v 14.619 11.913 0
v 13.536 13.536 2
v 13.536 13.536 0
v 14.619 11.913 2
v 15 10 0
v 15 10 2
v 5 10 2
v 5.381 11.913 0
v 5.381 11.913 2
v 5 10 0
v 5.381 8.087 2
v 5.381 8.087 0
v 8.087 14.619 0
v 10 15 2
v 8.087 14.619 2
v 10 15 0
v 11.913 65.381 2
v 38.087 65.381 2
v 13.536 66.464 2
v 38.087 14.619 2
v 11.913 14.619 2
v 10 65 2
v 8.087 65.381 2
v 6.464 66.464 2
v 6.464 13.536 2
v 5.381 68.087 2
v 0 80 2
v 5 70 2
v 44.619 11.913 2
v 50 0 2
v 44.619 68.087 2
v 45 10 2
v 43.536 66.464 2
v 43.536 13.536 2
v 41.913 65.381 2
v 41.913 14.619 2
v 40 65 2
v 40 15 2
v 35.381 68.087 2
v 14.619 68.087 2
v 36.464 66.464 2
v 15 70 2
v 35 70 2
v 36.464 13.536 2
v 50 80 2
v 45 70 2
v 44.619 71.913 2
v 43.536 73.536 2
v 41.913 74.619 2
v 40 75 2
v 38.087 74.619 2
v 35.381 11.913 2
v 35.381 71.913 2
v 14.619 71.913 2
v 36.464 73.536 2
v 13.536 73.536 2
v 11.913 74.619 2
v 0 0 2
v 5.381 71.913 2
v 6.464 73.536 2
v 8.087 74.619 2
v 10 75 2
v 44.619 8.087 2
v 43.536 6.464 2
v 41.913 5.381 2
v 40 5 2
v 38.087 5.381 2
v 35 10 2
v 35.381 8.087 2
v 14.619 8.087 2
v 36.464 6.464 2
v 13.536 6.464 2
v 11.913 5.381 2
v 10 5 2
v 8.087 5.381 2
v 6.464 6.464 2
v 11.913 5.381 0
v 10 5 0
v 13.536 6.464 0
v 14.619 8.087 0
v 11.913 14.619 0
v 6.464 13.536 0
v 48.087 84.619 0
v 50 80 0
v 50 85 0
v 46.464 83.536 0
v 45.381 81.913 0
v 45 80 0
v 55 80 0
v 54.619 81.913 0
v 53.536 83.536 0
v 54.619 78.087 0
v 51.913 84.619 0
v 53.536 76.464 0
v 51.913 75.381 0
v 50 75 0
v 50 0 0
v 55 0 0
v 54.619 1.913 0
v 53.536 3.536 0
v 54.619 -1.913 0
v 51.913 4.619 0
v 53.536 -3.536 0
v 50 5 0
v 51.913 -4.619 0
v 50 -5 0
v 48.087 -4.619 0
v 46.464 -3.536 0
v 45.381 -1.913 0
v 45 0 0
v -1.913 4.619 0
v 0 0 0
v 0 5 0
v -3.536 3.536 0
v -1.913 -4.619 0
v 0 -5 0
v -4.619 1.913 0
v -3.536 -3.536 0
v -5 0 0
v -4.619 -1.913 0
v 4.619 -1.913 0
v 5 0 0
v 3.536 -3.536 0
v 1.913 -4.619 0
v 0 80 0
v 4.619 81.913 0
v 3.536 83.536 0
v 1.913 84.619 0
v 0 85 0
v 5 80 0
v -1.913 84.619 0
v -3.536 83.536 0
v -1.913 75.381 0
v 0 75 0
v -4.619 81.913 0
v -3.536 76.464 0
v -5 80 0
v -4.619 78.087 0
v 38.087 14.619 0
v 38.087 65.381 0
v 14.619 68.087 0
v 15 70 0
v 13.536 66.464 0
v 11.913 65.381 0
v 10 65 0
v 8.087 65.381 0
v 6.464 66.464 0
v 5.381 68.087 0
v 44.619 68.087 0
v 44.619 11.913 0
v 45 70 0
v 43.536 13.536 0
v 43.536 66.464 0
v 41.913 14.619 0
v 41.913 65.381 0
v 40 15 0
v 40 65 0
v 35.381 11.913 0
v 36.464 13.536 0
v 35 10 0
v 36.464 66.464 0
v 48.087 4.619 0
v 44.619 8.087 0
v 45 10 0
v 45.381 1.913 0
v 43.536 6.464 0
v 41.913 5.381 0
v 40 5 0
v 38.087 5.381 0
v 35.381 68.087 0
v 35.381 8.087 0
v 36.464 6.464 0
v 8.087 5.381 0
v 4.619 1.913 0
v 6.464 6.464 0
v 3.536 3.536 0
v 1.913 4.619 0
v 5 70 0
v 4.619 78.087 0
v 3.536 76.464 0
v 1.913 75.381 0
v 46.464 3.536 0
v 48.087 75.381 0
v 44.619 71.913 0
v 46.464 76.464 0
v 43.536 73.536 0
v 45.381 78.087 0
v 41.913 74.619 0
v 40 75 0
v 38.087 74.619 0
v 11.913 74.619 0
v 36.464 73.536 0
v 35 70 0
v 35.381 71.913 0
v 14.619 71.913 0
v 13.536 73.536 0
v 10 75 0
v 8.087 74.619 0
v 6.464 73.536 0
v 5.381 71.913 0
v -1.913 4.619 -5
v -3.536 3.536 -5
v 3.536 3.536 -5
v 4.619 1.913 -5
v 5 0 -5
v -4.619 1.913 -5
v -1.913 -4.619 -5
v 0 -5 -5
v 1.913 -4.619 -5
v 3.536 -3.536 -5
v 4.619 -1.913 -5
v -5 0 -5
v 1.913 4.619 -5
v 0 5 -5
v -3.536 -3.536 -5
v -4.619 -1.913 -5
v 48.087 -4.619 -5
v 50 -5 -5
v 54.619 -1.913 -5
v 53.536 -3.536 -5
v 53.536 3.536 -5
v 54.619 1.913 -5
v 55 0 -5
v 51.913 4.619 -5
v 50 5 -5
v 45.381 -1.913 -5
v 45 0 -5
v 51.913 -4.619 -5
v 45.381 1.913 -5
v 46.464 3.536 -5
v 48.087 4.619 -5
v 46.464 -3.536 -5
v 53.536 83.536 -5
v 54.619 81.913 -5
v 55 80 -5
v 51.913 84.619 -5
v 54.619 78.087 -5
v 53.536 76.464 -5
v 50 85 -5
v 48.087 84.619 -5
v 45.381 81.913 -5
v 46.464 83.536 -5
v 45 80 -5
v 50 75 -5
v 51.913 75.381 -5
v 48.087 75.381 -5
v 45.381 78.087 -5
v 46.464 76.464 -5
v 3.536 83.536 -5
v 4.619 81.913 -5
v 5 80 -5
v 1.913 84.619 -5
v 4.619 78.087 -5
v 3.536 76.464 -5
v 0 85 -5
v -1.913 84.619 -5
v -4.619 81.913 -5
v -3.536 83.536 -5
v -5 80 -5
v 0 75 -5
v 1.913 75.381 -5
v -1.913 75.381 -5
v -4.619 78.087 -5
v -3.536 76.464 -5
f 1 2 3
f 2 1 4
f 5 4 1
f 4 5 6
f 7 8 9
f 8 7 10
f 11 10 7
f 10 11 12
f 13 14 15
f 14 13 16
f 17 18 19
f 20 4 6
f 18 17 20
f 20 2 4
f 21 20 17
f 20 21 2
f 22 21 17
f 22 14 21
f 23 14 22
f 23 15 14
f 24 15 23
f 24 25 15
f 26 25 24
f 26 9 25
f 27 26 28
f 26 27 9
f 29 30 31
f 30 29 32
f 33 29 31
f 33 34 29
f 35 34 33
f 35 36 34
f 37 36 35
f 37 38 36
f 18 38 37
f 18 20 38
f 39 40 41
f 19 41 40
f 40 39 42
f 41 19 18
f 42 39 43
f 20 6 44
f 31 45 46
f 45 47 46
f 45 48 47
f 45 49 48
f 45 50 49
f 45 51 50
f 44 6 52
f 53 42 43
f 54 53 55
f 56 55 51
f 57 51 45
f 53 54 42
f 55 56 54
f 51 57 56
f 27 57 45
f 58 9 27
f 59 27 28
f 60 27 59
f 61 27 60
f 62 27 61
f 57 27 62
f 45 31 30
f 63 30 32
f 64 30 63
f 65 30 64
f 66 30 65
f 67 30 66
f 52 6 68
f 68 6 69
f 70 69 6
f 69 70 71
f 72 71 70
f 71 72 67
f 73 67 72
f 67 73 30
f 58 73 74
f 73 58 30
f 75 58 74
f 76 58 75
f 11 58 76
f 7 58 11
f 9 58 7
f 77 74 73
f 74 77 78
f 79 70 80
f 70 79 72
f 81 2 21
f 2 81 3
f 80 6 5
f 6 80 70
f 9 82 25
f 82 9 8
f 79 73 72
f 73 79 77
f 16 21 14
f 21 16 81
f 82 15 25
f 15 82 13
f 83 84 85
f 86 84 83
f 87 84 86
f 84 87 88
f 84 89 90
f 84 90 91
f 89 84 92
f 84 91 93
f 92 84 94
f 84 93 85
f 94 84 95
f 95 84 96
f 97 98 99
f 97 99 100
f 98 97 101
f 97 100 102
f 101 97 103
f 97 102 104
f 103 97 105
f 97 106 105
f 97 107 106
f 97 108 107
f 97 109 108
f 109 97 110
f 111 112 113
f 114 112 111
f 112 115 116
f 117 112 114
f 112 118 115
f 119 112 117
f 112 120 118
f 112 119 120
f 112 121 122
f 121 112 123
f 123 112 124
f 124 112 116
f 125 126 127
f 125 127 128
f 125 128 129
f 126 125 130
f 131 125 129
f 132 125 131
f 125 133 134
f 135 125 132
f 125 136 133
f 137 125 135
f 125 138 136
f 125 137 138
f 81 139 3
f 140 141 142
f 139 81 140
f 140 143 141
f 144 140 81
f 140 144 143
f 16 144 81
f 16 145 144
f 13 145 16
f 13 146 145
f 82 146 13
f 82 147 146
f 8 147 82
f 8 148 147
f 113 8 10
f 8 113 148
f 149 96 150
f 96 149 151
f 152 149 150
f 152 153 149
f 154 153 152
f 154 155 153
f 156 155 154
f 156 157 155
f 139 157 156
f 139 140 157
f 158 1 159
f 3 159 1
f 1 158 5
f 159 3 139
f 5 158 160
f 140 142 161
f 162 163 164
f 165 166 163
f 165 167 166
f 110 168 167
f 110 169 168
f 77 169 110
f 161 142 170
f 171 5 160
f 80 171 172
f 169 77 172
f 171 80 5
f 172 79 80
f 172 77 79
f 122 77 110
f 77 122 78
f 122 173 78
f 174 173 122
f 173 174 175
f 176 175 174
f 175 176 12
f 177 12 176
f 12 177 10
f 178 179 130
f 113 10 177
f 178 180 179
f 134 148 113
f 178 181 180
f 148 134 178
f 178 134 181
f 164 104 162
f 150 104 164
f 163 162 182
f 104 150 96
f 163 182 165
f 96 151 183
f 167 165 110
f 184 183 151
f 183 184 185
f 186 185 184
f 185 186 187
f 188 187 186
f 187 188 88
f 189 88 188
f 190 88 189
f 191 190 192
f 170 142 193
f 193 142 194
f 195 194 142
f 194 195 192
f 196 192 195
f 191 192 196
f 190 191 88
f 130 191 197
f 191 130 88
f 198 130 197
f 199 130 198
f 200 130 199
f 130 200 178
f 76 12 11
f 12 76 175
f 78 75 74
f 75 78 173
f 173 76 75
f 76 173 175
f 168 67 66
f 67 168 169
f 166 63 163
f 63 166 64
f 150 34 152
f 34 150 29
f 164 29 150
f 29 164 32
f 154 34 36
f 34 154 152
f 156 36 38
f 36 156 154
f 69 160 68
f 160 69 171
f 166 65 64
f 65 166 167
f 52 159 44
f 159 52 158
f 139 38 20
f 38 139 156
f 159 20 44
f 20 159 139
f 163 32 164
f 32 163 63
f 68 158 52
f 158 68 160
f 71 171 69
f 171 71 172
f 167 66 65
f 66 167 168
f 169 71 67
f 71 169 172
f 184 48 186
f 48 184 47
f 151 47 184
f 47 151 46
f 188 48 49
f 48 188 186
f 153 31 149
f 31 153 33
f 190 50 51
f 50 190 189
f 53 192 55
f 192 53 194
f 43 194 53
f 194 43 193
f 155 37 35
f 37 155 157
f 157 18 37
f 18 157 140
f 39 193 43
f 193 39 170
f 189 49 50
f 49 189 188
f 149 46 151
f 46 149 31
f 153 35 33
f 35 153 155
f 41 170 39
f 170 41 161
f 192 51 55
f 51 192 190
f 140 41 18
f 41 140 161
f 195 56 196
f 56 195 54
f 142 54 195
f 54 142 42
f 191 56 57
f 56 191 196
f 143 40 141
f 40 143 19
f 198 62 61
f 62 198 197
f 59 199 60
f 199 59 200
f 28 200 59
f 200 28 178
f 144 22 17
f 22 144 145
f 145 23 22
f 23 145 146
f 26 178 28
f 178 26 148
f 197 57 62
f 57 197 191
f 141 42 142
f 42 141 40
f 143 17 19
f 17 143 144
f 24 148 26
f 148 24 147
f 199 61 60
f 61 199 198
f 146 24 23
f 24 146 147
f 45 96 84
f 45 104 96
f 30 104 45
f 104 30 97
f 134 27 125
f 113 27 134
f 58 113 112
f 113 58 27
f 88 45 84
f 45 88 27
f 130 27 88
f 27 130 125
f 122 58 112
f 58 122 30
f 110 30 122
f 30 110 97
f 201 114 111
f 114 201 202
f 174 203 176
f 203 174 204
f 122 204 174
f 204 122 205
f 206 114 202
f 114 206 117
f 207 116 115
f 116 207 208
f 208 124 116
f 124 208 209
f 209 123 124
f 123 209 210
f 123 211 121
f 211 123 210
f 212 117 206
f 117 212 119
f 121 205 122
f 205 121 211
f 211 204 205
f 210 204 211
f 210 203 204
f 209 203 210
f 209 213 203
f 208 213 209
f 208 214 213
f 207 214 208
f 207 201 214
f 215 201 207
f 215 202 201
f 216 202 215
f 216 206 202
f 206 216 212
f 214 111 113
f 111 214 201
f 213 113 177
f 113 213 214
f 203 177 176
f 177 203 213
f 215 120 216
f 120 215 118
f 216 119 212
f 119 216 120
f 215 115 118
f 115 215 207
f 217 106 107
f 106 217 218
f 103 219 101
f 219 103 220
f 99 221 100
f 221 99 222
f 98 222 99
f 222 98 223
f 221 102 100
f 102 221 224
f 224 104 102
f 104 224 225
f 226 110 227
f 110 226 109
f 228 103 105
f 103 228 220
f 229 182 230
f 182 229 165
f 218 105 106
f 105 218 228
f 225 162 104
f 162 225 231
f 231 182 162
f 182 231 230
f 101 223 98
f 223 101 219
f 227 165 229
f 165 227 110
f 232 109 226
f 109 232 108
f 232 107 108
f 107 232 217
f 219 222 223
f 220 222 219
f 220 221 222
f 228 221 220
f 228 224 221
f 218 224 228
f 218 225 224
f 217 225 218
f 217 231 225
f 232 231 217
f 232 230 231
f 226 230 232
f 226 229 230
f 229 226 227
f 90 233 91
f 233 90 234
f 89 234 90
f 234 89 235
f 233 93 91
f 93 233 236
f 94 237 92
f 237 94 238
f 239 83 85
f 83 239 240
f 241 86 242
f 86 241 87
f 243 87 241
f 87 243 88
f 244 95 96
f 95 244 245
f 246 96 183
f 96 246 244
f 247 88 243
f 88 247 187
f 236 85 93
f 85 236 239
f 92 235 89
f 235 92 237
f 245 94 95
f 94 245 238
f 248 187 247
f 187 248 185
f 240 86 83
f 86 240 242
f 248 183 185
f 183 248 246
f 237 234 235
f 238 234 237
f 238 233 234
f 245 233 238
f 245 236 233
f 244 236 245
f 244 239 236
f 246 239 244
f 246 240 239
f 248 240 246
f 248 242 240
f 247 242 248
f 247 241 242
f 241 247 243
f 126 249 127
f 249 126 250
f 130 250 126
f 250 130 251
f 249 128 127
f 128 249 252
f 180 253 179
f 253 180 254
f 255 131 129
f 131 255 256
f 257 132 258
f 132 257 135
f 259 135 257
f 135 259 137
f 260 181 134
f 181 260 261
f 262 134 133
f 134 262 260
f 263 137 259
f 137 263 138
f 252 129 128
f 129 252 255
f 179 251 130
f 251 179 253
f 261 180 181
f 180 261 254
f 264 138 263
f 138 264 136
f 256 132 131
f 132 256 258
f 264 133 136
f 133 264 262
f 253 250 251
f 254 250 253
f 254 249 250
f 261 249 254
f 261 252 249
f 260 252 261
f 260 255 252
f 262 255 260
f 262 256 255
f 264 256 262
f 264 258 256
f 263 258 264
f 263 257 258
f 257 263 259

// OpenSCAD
// file: ../../../assets/components/triangular_right_prism.scad
module triangular_right_prism(l, w, h){
    polyhedron(//pt 0        1        2        3        4        5
        points=[[0,0,0], [l,0,0], [l,w,0], [0,w,0], [0,0,h], [l,0,h]],
        faces=[[0,1,2,3],[5,4,3,2],[0,4,5,1],[0,3,4],[5,2,1]]
    );
}
// file: ../../../assets/components/vents.scad
/*
    Produces an alternating pattern that tries to fit in as many
    slots with the given radius in the given area. rows of slots
    alternate indentation

    parameters:
    -a  side a size
    -b  side b size
    -r  radius of the slot circles, their centers are one diameter appart
*/

module vent_pattern(a, b, r = 2,) {
    $fn=10;
    l = r * 2;
    col_size = l + (r * 3);
    row_size = (r * 3);
    rows = b / row_size;
    cols = a / col_size;
    translate([-(col_size * (cols-1) / 2), -(row_size * (rows-1) / 2), 0])
    for(row=[0:rows - 1]) {
        for(col=[0:cols - 1]){
            translate([col_size * col - (row % 2 * col_size / 2), row_size * row ,0])
            hull() {
                circle(r);
                translate([l,0,0])
                circle(r);
            }
        }
    }
}

// showcase
vent_pattern(a = 20, b = 10, r = 1);
// file: ../../../assets/assemblies/insert_mounts.scad
use <../components/triangular_right_prism.scad>

/*
    module insert_mount
    -
    This module is thought to be used for threaded insert mounts,
    if used only for fasteners consider the difference of diameter
    between the threads and the shaft.
    -
    parameters:
    -h                  total height of the mount
    -insert_r           radius of the screw or insert
    -thickness        thickness of the supports and walls around the insert
    -support_h          height of the support as percent of h
    -support_amount     number of supports
    -support_every_deg  degrees between supports
    -
    notice that ideally the support_amount x support_every_deg should
    not equal more than 360
*/

module insert_mount(
    h = 10,
    insert_r = 1.75,
    thickness = 2,
    support_h = 100,
    support_amount = 4,
    support_every_deg = 90
) {
    $fn=15; // set facette number
    support_h = h * support_h / 100;

    // The body of the mount
    difference() {
        cylinder(h = h, r = insert_r + thickness);
        cylinder(h = h, r = insert_r);
    }

    // Supports
    if (support_amount) {
        rotate(-90) // First support to point to the positive x side
        for(i=[0:support_amount - 1]) {
            rotate(i * support_every_deg) {
                translate([-thickness/2,0,0]){
                    translate([0 , insert_r, 0])
                    cube([thickness, thickness, support_h]);

                    translate([0, insert_r + thickness, 0])
                    triangular_right_prism(thickness, support_h, support_h);
                }
            }
        }
    }
}

/*
    block of four insert mounts

    params:
    -x              distance between corner screw-hole centers in the x axis
    -y              distance between corner screw-hole centers in the y axis
    -h              height of the mounts
    -insert_r       radius of the inserns or screw to be used
    -thickness_w    thickness of the walls around the inserts
    -supports       number of supports, more than 4 has no effect

*/

module insert_mount_block(
    size,
    insert_r = 1.75,
    thickness = 2,
    supports = 2
) {
    for (i = [0:1]) {
        for (j = [0:1]) {
            translate([i * size.x, j * size.y, 0])
            mirror([i, j, 0]) // Make all point to the center
            insert_mount(
                h = size.z,
                insert_r = insert_r,
                thickness = thickness,
                support_h = 100,
                support_amount = supports
            );
        }
    }
}

// showcase
insert_mount_block(size = [84, 40, 10], supports = 2);
// file: ../../../assets/components/box.scad
/*
    A simple parametric box (without cover)

    parameters:
    -size           is a vector [x, y, z]
    -thickness_b    the thickness of the bottom face
    -thickness_w    The thickness of the wall faces
*/

module box (
    size,
    thickness_b = 2,
    thickness_w = 2
) {
    difference() {
        cube([size.x, size.y, size.z]);

        translate(v = [thickness_w, thickness_w, thickness_b]){
            cube([size.x - thickness_w * 2, size.y - thickness_w * 2, size.z]);
        }
    }
}


box([30, 20, 5]);
// file: ../../../assets/components/fastener_holes.scad
/*
    Intended to make space for a fastener.

    parameters:
    -head           a vector [head length, head radius]
    -bore           a vector [bore length, bore radius]
    -countersink    countersink length, requires head radius and bore radius
*/

module fastener_hole(
    head = [0, 5],
    bore = [0, 3],
    countersink = 5
) {
    if (head[0] && head[1])
    cylinder(h = head[0], r = head[1], center = false);
    translate([0,0,-countersink]) {
        if (countersink)
        cylinder(h = countersink, r1 = bore[1], r2 = head[1], center = false);

        translate([0,0,-bore[0]]) {
            if (bore[0] && bore[1])
            cylinder(h = bore[0], r = bore[1], center = false);
        }
    }
}

module fastener_block(
    size,
    head = [0, 0],
    bore = [0, 0],
    countersink = 0
) {

    fastener_hole(head = head, bore = bore, countersink = countersink);
    translate([size.x, 0])
    fastener_hole(head = head, bore = bore, countersink = countersink);
    translate([size.x, size.y])
    fastener_hole(head = head, bore = bore, countersink = countersink);
    translate([0, size.y])
    fastener_hole(head = head, bore = bore, countersink = countersink);

}

module fastener_radial(
    radius,
    amount,
    head = [0, 6],
    bore = [0, 3],
    countersink = 5
) {
    step = 360 / amount;
    for(i = [0:amount]){
        rotate(i * step, [0,0,1])
        translate([radius,0,0]) 
        fastener_hole(head=head, bore=bore, countersink=countersink);
    }
}

// showcase
fastener_hole(
    head = [3,5],
    bore = [7,2],
    countersink = 3
);

translate([100, 0, 0]) 
fastener_block(
    size = [20, 40],
    head = [3, 5],
    bore = [10, 2],
    countersink = 0
);

translate([-150, 0, 0]) 
fastener_radial(
    radius = 50,
    amount = 8,
    head = [0, 7],
    bore = [0, 3],
    countersink = 5
);
// file: ../../../assets/assemblies/case.scad
use <../components/fastener_holes.scad>
use <../components/box.scad>
use <insert_mounts.scad>
use <../components/vents.scad>
/*

*/


module case_lid(
    size,
    thickness,
    insert_r,
    bore_r,
) {
    bore_offset = thickness + insert_r;
    dx = size.x - bore_offset * 2;
    dy = size.y - bore_offset * 2;

    difference() {
        cube([size.x, size.y, thickness]);

        translate([bore_offset, bore_offset, thickness])
        fastener_block([dx, dy], bore = [thickness, bore_r]);
    }
}

module case_housing(
    size,
    thickness = 2,
    insert_r = 1.75,
) {
    difference() {
        box(size = size, thickness_b = thickness, thickness_w = thickness);

        // vents
        translate([size.x / 2, size.y, size.z / 2])
        rotate(a = 90, v = [1,0,0])
        linear_extrude(height = size.y)
        vent_pattern(a = size.x / 2, b = size.z - thickness * 2, r = 1);
    }

    // screw, threaded insert holes
    mount_x = size.x - (thickness + insert_r) * 2;
    mount_y = size.y - (thickness + insert_r) * 2;
    translate([thickness + insert_r, thickness + insert_r, 0])
    insert_mount_block(size=[mount_x, mount_y, size.z], insert_r=insert_r, supports = 0);
}


// showcase

size = [90, 70, 20];
thickness = 2;
insert_r = 2;
bore_r = 1;

case_housing(size = size, thickness = thickness, insert_r = insert_r);

translate([0,0,25])
case_lid(size = size, thickness = thickness, insert_r = insert_r, bore_r = bore_r);
// main file
use <../../../assets/assemblies/case.scad>
use <../../../assets/components/fastener_holes.scad>

lid_size = [50, 80];
thickness = 2;
bore_r = 5;
insert_r = 8;


#case_lid(size = lid_size, thickness = thickness, insert_r = insert_r, bore_r = bore_r);
fastener_block(size = lid_size, head = [0, 0], bore = [5, 5], countersink = 0);
